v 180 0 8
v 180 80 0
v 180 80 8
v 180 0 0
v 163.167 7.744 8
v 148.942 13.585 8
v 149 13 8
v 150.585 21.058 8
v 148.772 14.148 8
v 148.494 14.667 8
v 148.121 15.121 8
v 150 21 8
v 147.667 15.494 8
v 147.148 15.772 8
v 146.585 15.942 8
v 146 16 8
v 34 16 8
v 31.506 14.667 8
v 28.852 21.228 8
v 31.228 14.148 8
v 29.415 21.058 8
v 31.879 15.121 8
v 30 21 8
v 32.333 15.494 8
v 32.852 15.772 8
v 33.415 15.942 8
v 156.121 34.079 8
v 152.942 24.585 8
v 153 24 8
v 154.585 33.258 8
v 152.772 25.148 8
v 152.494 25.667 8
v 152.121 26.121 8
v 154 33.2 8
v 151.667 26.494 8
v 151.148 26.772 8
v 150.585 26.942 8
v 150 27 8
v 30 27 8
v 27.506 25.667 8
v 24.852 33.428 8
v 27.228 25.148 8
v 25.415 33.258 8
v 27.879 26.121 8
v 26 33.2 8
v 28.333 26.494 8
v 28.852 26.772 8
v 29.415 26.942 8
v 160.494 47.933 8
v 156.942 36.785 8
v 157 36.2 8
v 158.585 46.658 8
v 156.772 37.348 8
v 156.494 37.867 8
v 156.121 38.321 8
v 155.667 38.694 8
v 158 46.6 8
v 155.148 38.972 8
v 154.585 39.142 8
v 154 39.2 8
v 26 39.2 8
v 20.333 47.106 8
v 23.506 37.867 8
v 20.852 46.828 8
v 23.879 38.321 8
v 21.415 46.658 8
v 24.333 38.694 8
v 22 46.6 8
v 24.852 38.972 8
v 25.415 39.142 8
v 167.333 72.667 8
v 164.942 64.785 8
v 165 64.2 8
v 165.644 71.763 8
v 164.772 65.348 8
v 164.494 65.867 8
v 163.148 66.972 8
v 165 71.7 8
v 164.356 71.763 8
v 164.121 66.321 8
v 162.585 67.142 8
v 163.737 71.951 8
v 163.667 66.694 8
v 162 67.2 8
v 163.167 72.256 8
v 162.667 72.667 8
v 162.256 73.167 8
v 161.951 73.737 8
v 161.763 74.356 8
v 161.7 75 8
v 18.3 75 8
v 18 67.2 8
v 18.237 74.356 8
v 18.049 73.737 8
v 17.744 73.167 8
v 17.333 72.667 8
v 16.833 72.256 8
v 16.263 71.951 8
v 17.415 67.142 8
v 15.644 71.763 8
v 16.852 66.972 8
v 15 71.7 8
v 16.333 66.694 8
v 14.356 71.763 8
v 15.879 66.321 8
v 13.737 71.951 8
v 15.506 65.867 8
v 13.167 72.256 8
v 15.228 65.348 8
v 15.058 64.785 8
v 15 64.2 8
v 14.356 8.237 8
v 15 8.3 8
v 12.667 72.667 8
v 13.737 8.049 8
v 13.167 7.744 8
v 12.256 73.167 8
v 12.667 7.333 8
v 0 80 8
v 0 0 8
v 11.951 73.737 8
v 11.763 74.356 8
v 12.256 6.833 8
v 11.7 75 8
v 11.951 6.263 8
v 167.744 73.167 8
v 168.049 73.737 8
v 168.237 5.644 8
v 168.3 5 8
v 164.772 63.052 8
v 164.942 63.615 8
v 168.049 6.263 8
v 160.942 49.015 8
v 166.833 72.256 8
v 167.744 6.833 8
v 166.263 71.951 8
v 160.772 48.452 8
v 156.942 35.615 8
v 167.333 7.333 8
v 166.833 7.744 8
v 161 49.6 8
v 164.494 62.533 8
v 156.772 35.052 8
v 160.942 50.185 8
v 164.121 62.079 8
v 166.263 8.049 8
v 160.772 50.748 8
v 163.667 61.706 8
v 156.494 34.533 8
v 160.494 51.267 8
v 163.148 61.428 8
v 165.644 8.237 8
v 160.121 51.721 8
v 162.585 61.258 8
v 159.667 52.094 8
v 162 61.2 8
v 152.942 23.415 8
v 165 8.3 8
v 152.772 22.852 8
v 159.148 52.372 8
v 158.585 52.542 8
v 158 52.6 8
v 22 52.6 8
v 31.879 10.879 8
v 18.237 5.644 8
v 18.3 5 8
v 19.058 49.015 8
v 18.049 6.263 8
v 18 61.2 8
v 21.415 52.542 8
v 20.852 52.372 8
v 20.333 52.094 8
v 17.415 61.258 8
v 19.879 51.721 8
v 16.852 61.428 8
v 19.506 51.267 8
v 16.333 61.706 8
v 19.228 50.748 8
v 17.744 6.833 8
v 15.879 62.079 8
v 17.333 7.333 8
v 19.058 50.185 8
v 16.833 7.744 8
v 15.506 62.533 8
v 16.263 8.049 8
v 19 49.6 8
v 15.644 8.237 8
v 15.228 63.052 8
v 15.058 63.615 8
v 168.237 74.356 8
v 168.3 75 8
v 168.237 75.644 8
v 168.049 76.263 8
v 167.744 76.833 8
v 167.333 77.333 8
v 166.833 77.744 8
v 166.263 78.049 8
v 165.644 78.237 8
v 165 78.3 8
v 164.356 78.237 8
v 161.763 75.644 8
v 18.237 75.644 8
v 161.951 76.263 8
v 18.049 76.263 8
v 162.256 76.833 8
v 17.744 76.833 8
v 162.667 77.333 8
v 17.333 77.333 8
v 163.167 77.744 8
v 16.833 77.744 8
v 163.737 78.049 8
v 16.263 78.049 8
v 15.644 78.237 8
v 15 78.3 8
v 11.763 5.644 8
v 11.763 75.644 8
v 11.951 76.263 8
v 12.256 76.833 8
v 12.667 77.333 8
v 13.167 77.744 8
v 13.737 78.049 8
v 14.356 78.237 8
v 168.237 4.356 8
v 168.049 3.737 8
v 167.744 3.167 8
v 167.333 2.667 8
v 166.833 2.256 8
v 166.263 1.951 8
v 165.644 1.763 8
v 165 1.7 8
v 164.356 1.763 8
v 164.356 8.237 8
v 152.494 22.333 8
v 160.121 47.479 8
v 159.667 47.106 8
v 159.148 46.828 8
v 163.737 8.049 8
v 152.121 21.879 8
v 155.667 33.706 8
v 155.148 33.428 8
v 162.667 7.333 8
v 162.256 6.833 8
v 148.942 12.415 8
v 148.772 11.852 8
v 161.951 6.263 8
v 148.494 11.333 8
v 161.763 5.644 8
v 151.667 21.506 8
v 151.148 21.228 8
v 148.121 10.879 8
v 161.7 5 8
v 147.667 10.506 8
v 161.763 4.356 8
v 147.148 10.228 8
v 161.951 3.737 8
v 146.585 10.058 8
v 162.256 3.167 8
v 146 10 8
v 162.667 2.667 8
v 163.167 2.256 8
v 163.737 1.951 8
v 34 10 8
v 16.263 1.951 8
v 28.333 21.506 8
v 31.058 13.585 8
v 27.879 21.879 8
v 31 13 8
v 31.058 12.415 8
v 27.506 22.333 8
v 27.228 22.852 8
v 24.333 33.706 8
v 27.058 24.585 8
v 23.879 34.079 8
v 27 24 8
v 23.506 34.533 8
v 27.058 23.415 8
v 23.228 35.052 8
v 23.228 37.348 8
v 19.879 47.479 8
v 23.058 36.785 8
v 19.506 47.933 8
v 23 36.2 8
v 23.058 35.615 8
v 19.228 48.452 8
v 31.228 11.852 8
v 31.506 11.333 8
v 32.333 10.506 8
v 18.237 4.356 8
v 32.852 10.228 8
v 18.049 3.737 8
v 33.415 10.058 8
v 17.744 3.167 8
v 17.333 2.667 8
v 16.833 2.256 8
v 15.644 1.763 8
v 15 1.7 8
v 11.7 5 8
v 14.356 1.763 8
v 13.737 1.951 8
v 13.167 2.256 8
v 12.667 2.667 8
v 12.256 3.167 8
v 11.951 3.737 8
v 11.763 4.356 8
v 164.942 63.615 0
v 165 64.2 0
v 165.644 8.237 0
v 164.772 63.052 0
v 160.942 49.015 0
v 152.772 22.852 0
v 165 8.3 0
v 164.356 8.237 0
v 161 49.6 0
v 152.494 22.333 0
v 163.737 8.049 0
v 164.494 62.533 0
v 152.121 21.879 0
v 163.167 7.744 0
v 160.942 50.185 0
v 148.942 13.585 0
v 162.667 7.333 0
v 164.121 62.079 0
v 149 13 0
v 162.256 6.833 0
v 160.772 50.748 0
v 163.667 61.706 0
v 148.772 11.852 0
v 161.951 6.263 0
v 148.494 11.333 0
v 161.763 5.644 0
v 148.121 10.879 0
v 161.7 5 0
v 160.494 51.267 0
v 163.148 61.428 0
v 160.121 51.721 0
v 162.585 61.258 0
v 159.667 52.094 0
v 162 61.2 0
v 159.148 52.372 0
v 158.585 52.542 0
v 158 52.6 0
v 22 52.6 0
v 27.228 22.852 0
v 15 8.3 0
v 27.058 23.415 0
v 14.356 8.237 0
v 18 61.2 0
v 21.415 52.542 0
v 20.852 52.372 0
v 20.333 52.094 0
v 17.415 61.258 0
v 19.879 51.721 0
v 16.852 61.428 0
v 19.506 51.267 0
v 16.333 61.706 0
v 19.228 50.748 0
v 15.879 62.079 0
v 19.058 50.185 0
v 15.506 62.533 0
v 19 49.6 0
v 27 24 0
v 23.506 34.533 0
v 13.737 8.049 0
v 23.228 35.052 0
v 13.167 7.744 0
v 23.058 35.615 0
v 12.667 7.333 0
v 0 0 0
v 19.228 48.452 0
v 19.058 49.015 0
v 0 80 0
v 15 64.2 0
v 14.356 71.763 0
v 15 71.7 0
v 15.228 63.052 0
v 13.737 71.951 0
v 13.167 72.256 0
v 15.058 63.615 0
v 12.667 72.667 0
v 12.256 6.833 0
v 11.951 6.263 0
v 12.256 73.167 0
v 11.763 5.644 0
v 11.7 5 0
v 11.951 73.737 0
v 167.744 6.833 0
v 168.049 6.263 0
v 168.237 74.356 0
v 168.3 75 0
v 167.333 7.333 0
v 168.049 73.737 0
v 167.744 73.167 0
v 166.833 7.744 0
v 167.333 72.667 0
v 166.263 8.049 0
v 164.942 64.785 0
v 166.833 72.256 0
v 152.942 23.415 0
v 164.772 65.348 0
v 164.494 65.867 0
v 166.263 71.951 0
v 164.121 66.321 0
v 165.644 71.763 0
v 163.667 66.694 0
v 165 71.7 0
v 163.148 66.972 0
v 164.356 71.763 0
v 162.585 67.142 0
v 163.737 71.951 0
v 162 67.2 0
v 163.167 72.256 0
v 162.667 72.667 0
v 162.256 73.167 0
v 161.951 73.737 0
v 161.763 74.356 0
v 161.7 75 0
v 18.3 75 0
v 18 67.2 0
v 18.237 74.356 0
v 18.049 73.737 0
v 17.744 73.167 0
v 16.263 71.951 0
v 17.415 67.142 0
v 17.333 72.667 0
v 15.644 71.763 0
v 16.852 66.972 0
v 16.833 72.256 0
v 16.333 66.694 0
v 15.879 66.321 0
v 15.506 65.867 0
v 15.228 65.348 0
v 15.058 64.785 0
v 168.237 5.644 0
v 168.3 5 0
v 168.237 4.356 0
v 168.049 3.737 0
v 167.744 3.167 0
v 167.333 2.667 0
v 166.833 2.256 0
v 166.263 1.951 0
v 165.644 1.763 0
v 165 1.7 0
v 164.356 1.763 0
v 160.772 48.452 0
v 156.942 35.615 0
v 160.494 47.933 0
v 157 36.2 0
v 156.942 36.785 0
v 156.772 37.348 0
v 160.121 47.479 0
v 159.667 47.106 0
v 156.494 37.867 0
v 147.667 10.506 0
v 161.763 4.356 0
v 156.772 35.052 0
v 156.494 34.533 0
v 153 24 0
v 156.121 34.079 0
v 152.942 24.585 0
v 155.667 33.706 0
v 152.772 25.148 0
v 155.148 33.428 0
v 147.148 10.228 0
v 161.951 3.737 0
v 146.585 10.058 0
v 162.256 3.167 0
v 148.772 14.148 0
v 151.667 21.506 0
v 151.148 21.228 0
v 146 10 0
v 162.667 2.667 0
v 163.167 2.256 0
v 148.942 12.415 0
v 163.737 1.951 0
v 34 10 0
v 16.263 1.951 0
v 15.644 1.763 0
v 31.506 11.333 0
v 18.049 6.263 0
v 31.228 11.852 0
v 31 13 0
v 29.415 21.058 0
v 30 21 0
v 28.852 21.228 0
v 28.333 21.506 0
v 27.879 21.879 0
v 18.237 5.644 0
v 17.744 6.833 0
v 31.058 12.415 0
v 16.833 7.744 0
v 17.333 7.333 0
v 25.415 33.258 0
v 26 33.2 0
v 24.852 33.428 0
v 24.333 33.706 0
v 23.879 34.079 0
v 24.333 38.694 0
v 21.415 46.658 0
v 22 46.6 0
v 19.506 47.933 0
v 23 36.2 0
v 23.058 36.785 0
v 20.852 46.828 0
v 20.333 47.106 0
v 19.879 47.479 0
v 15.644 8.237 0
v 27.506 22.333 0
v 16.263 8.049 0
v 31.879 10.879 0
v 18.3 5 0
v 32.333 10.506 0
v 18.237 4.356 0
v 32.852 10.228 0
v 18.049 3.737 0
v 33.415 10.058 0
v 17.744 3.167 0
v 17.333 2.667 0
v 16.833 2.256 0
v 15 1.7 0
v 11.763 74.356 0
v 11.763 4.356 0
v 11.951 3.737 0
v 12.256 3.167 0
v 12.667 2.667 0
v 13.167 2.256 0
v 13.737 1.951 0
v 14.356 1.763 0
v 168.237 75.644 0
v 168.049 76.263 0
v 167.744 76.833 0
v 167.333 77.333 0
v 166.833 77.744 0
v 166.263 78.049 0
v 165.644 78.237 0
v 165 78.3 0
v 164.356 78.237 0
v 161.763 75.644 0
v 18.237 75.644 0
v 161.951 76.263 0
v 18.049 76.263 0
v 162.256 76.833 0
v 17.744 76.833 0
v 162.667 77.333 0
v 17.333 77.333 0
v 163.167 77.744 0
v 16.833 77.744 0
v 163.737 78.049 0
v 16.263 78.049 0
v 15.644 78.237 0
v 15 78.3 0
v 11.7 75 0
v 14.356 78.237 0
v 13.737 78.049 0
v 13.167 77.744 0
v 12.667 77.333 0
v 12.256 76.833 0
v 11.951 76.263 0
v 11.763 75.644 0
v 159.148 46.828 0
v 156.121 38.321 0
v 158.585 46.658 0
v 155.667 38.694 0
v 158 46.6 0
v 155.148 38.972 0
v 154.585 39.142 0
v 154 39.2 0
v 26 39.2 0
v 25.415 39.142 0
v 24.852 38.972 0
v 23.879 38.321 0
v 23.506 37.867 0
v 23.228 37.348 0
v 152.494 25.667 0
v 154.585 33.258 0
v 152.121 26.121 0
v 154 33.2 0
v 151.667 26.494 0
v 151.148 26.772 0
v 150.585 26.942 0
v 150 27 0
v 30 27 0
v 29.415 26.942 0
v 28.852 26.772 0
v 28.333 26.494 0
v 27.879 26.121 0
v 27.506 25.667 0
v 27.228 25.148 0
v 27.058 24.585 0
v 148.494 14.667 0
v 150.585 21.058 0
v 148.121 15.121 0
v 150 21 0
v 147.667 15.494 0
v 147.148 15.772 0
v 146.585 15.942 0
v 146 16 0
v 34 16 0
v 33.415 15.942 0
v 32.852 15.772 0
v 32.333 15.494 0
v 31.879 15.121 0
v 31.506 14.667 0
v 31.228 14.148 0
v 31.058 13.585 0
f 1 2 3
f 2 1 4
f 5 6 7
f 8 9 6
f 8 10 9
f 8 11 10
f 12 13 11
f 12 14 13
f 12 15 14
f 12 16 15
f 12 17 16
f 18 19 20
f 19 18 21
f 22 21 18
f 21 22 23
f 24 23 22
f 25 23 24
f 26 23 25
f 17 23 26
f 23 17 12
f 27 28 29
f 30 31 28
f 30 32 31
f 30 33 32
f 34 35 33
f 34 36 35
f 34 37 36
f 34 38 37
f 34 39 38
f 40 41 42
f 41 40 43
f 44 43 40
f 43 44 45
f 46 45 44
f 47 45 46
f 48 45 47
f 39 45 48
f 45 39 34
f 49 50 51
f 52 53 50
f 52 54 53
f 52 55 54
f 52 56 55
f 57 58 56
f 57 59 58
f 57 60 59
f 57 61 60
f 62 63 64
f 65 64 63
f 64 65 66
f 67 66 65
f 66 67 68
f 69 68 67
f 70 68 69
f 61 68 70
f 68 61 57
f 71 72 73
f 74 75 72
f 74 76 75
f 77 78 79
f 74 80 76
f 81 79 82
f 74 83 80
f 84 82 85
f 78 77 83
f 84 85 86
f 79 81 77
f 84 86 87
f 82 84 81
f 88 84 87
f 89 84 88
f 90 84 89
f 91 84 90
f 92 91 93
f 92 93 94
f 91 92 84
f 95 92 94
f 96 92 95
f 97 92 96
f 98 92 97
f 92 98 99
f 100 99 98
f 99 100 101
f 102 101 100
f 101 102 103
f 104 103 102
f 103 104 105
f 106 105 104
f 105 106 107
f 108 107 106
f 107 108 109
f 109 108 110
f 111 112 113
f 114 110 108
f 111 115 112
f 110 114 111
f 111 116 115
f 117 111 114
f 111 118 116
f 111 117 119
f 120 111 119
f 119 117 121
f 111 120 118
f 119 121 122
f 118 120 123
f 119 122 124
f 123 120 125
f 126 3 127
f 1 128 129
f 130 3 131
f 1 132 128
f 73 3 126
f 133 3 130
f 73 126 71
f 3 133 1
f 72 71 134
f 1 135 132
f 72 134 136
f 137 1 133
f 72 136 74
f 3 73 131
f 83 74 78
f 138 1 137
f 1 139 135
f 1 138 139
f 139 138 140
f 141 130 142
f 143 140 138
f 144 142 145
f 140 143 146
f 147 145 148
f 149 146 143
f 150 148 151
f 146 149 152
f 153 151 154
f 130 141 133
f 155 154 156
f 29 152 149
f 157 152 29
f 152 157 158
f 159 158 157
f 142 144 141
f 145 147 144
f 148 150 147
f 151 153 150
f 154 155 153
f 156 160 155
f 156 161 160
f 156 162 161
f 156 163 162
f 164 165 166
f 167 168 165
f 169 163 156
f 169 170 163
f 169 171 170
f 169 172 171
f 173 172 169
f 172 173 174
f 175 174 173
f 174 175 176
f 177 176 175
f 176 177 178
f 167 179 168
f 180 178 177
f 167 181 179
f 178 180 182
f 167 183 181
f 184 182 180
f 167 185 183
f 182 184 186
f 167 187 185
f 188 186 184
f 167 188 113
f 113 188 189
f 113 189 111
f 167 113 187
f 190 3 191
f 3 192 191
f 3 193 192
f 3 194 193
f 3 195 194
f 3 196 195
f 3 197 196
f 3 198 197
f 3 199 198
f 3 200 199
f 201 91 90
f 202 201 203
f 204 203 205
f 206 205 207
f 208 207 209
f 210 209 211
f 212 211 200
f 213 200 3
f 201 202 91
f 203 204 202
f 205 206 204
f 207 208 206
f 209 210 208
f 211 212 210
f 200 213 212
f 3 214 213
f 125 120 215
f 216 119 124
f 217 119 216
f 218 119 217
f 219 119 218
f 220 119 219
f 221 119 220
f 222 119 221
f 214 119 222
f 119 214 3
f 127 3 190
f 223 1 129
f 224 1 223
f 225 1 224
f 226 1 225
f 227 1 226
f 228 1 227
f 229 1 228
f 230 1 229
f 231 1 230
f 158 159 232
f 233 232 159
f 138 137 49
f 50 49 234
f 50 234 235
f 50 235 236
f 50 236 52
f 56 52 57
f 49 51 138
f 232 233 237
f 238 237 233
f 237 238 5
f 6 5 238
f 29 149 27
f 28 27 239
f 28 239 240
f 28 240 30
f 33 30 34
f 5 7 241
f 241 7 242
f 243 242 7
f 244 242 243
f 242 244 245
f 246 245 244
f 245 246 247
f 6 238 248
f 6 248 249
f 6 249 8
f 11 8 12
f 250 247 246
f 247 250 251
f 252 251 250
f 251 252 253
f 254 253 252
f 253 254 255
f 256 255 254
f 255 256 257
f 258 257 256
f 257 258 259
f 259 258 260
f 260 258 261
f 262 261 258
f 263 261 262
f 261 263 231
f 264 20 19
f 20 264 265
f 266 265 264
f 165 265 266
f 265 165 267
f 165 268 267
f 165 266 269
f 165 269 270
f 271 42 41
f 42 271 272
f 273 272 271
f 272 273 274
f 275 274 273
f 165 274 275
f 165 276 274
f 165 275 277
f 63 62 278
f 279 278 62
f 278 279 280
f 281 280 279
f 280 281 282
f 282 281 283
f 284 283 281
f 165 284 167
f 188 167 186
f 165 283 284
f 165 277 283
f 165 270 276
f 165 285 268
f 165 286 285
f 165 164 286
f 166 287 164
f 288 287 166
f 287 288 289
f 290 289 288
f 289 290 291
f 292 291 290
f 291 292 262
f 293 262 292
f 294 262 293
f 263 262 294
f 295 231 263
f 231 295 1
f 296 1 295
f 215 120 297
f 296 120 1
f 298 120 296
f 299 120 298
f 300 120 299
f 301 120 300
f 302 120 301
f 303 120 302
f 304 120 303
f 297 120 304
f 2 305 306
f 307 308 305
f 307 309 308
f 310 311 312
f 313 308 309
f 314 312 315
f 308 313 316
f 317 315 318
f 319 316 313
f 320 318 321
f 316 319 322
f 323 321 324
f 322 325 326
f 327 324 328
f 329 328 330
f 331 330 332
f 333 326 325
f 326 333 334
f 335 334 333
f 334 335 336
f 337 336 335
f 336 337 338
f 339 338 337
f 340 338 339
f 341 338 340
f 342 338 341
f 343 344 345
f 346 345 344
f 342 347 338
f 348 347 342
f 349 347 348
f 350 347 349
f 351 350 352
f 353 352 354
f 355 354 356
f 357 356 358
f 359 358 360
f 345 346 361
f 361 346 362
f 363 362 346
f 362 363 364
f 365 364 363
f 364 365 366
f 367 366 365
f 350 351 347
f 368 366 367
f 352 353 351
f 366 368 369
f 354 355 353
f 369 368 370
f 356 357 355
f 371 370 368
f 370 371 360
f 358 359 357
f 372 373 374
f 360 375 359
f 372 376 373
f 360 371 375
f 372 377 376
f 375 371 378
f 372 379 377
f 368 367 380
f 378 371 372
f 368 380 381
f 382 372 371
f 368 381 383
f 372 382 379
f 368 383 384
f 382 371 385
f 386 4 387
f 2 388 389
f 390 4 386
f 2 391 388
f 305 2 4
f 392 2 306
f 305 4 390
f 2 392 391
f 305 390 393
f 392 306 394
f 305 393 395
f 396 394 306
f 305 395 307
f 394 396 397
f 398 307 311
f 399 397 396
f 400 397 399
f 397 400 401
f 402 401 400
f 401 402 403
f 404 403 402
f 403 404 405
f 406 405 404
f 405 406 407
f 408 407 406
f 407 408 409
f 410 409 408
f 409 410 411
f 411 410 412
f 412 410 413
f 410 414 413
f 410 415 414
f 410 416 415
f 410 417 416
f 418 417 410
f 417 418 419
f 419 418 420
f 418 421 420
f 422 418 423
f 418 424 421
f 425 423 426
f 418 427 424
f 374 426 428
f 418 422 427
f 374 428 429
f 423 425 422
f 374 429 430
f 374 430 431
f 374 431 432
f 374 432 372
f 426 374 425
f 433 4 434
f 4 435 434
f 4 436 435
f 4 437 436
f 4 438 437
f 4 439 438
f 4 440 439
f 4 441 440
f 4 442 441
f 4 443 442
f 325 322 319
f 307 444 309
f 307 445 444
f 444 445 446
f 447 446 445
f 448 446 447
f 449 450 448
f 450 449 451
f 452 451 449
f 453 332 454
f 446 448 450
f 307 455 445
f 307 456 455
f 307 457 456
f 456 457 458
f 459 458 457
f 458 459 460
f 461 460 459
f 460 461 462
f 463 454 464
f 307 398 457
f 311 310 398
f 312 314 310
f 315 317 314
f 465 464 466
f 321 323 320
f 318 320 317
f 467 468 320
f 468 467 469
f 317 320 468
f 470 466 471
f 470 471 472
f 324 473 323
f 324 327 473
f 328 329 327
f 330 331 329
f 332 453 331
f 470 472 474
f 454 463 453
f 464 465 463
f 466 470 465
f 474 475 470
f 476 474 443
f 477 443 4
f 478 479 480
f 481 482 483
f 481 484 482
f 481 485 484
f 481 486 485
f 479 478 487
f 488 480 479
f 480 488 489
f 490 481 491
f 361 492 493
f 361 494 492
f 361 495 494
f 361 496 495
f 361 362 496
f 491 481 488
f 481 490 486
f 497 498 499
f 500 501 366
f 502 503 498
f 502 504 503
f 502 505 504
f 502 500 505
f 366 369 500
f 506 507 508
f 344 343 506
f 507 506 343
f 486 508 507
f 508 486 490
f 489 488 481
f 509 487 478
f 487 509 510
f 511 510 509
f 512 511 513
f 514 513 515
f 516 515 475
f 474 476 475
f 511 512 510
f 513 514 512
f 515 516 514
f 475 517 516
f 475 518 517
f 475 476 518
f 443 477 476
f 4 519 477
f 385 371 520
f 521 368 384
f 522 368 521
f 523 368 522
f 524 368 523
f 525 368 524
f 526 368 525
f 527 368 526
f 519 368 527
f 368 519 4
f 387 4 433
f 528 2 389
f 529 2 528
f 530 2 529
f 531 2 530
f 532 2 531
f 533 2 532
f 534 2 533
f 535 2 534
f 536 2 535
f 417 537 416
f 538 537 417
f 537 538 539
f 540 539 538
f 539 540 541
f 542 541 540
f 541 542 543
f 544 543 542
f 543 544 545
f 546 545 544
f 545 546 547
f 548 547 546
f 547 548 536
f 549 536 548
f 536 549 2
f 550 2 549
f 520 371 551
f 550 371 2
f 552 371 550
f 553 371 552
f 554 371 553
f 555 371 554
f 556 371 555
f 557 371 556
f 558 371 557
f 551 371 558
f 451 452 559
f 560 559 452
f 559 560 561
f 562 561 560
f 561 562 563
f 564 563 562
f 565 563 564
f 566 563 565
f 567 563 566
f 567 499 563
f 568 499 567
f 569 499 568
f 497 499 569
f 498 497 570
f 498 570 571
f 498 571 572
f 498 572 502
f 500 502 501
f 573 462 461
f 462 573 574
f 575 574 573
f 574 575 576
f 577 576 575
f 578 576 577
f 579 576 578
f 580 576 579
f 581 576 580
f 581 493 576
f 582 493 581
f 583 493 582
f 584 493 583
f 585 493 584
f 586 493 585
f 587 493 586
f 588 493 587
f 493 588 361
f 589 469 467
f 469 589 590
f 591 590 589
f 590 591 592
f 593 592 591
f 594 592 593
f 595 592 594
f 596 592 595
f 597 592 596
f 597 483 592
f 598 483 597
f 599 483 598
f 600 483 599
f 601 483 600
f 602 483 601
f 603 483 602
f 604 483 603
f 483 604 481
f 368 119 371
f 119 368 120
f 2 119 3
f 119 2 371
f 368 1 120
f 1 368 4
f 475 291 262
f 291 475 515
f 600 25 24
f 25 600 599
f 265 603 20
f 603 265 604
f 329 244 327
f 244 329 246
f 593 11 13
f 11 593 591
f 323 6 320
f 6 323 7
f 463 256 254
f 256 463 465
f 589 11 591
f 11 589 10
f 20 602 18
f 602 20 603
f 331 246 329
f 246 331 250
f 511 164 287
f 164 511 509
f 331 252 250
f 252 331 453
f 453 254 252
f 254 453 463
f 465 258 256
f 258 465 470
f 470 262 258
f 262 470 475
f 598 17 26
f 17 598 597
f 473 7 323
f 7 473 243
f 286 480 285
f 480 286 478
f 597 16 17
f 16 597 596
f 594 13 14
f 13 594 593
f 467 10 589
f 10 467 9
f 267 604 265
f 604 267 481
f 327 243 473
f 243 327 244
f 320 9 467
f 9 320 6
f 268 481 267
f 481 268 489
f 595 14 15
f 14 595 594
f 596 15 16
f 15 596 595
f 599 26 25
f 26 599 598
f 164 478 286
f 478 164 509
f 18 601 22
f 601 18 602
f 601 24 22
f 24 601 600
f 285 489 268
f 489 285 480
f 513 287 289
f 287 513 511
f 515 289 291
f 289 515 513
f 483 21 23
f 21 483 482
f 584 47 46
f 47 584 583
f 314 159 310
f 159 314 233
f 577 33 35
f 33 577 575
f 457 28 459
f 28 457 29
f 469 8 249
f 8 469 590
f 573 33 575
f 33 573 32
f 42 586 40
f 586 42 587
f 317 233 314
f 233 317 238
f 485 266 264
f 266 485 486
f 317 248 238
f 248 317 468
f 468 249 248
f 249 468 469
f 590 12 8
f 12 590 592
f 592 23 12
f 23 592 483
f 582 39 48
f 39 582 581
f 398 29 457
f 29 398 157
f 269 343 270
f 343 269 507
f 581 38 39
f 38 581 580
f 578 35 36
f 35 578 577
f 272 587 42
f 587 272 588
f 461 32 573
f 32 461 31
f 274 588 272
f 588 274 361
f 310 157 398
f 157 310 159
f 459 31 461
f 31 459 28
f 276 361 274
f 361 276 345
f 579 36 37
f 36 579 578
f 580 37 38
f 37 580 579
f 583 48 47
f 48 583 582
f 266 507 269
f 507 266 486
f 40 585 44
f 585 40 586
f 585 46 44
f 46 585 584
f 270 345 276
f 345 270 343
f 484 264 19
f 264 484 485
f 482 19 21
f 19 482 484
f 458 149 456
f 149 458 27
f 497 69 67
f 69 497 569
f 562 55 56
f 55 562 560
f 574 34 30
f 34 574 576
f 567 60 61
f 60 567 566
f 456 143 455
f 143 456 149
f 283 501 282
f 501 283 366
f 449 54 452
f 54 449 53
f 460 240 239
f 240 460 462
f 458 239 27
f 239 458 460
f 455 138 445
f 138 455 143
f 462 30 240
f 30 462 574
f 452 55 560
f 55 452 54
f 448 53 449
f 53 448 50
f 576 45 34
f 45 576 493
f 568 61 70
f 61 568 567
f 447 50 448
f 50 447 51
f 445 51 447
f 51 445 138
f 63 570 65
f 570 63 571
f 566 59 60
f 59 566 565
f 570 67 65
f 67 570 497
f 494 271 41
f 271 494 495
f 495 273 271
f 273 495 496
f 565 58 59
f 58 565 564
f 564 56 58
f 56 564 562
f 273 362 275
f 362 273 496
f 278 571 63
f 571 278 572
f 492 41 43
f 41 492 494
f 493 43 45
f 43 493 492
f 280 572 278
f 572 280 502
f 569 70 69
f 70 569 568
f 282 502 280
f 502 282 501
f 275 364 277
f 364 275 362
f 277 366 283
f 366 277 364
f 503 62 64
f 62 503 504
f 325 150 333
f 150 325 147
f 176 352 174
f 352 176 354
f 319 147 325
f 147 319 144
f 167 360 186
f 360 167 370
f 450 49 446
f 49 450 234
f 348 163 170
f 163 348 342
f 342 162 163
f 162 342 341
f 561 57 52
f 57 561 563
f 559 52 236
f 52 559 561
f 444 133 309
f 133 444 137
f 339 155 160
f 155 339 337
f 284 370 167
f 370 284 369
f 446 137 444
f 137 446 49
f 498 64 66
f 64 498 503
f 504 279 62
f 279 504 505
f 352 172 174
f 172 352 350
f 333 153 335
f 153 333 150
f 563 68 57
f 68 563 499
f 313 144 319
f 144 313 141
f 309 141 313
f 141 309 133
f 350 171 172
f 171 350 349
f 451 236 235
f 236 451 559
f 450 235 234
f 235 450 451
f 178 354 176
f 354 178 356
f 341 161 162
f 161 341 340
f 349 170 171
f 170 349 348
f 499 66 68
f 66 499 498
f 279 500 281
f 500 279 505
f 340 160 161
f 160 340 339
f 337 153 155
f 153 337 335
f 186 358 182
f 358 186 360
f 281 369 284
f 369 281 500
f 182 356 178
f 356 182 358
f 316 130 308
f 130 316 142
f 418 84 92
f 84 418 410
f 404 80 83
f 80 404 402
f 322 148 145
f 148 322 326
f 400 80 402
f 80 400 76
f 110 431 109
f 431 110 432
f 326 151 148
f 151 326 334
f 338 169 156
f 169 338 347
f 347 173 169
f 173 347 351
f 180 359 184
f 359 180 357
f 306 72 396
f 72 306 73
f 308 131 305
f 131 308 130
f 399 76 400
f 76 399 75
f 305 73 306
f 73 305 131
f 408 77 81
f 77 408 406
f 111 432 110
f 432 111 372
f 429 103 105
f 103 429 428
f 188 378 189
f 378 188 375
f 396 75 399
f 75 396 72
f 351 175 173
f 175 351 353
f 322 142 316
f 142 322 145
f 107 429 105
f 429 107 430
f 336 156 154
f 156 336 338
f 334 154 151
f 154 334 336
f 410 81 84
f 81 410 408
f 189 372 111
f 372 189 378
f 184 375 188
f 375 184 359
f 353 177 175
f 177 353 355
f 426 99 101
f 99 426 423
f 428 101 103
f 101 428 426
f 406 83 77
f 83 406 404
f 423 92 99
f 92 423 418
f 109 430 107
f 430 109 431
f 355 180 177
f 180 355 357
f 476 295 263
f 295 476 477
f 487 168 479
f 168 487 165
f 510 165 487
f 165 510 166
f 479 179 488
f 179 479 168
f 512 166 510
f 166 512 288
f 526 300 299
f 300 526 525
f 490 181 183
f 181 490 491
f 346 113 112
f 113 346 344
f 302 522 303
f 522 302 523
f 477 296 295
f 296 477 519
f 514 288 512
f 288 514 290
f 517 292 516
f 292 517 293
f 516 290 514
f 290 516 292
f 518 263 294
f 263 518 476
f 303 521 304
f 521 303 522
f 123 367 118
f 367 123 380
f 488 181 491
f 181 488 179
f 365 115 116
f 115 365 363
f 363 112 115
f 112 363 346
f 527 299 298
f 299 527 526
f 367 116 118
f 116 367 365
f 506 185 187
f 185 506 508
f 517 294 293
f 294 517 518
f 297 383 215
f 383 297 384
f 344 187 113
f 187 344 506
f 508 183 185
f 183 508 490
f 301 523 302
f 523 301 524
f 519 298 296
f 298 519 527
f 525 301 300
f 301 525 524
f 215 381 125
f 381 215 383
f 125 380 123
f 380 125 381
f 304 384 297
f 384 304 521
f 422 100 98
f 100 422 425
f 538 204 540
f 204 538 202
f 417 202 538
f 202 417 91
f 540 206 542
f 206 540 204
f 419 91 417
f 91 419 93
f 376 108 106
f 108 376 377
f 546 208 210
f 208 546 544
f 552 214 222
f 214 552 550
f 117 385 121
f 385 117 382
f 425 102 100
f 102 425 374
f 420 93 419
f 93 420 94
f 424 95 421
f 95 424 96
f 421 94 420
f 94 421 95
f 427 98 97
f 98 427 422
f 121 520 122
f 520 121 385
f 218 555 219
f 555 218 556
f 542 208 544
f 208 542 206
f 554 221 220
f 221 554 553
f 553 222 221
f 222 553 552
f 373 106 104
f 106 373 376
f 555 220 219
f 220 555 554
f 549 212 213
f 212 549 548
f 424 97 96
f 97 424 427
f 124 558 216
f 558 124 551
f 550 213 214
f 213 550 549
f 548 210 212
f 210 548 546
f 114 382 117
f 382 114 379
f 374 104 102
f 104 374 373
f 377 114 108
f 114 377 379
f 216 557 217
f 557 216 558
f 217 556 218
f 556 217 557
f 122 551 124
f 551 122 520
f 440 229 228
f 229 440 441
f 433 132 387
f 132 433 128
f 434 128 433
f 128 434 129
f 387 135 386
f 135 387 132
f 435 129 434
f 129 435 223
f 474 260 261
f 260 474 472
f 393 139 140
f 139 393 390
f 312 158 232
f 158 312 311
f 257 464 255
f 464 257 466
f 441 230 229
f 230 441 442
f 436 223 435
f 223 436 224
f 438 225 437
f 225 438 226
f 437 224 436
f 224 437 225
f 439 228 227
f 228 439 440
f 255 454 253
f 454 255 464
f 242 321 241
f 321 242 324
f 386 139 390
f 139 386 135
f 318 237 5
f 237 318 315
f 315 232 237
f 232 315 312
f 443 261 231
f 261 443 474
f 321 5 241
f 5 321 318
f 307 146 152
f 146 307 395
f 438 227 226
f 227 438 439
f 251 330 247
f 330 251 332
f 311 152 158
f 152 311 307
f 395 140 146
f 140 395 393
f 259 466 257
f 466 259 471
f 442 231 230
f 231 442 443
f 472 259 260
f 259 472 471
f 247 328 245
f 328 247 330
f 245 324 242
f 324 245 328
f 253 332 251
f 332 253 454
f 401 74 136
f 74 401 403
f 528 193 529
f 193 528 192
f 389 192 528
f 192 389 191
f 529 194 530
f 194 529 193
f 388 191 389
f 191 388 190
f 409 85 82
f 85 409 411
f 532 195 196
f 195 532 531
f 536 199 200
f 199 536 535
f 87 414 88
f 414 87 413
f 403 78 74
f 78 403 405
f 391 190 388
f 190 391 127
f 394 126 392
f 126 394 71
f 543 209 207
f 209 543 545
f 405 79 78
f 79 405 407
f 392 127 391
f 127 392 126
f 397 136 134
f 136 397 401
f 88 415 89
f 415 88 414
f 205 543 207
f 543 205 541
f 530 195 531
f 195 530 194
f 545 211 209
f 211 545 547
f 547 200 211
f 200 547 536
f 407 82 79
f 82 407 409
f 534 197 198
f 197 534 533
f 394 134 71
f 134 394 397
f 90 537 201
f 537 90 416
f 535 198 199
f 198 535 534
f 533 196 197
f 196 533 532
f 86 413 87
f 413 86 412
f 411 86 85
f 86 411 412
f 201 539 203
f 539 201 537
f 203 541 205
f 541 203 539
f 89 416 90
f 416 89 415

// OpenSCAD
$fn = 32;

// ----------------------------------------------------------------------
// Slotted panel: 180 x 80 mm, 5 рядов of slots
// ----------------------------------------------------------------------

// --- parameters (mm) ---
panel_w = 180;            // panel width
panel_d = 80;             // panel depth
thick = 8;                // panel thickness
slot_w = 6;               // slot width
pitch0 = 11;              // first row pitch
pitch_step = 1.2;         // pitch increase per row
margin = 10;              // margin around the slot field
rows = 5;                 // number of slot rows
mount_d = 6.6;            // mounting holes
mount_x = 75;             // mounting hole offset

difference() {
  union() {
    cube([panel_w, panel_d, thick]);
  }
  /* slot rows: stadium shaped cutters, 2.5 mm clear of both faces */
  /* row 0: pitch 11, length 112 */
  hull() {
    translate([34, 13, -2.5]) cylinder(h = thick + 5, d = slot_w);
    translate([146, 13, -2.5]) cylinder(h = thick + 5, d = slot_w);
  }
  /* row 1: pitch 12.2, length 120 */
  hull() {
    translate([30, 24, -2.5]) cylinder(h = thick + 5, d = slot_w);
    translate([150, 24, -2.5]) cylinder(h = thick + 5, d = slot_w);
  }
  /* row 2: pitch 13.4, length 128 */
  hull() {
    translate([26, 36.2, -2.5]) cylinder(h = thick + 5, d = slot_w);
    translate([154, 36.2, -2.5]) cylinder(h = thick + 5, d = slot_w);
  }
  /* row 3: pitch 14.6, length 136 */
  hull() {
    translate([22, 49.6, -2.5]) cylinder(h = thick + 5, d = slot_w);
    translate([158, 49.6, -2.5]) cylinder(h = thick + 5, d = slot_w);
  }
  /* row 4: pitch 15.8, length 144 */
  hull() {
    translate([18, 64.2, -2.5]) cylinder(h = thick + 5, d = slot_w);
    translate([162, 64.2, -2.5]) cylinder(h = thick + 5, d = slot_w);
  }
  translate([15, 5, -2.5]) cylinder(h = 13, d = mount_d);
  translate([15, 75, -2.5]) cylinder(h = 13, d = mount_d);
  translate([165, 5, -2.5]) cylinder(h = 13, d = mount_d);
  translate([165, 75, -2.5]) cylinder(h = 13, d = mount_d);
}
